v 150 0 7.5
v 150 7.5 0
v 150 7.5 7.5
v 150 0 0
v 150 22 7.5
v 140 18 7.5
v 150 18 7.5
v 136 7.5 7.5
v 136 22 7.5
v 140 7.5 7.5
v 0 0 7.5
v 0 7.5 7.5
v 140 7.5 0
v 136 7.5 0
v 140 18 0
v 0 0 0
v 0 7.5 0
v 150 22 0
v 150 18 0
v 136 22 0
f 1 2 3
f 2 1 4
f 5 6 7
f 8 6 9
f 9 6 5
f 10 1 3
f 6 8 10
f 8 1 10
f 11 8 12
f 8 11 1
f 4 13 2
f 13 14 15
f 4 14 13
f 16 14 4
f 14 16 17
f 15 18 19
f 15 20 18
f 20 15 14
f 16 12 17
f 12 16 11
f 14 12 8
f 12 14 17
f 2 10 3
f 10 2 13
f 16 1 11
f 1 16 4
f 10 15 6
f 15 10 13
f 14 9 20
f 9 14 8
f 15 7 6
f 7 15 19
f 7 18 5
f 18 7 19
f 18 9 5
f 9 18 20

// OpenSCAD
// file: ../../container.scad
function defaultBottomThickness() = 1;
function defaultBottomClearance() = 16;
function defaultMinWallThickness() = 1;
function defaultWallClearance() = 16;
function defaultSideMultiple() = 2;

function getOuterWidth(innerWidth, minWallThickness, sideMultiple) = ceil((innerWidth + 2*minWallThickness)/sideMultiple)*sideMultiple;
function getOuterDepth(innerDepth, minWallThickness, sideMultiple) = ceil((innerDepth + 2*minWallThickness)/sideMultiple)*sideMultiple;
function getSideWallThickness(innerWidth, minWallThickness, sideMultiple) = (getOuterWidth(innerWidth, minWallThickness, sideMultiple) - innerWidth)/2;
function getFrontWallThickness(innerDepth, minWallThickness, sideMultiple) = (getOuterDepth(innerDepth, minWallThickness, sideMultiple) - innerDepth)/2;

function getFrontHole(innerWidth, innerDepth, outerHeight, bottomClearance, minWallThickness, frontWallClearance, sideMultiple) = [
    [
        getSideWallThickness(innerWidth, minWallThickness, sideMultiple) + frontWallClearance,
        0,
        bottomClearance
    ],
    [
        max(5, innerWidth - 2*frontWallClearance),
        getOuterDepth(innerDepth, minWallThickness, sideMultiple),
        outerHeight
    ]
];

function getSideHole(innerWidth, innerDepth, outerHeight, bottomClearance, minWallThickness, sideWallClearance, sideMultiple) = [
    [
        0,
        getFrontWallThickness(innerDepth, minWallThickness, sideMultiple) + sideWallClearance,
        bottomClearance
    ],
    [
        getOuterWidth(innerWidth, minWallThickness, sideMultiple),
        max(5, innerDepth - 2*sideWallClearance),
        outerHeight
    ]
];

module container (
    innerWidth,
    innerDepth,
    outerHeight,
    type = "solid",
    bottomThickness = defaultBottomThickness(),
    bottomClearance = defaultBottomClearance(),
    minWallThickness = defaultMinWallThickness(),
    frontWallClearance = defaultWallClearance(),
    sideWallClearance = defaultWallClearance(),
    sideMultiple = defaultSideMultiple()
) {
    innerHeight = outerHeight - bottomThickness;
    
    outerWidth = getOuterWidth(innerWidth, minWallThickness, sideMultiple);
    outerDepth = getOuterDepth(innerDepth, minWallThickness, sideMultiple);
    sideWallThickness = getSideWallThickness(innerWidth, minWallThickness, sideMultiple);
    frontWallThickness = getFrontWallThickness(innerDepth, minWallThickness, sideMultiple);

    echo("Width", innerWidth, outerWidth, sideWallThickness);
    echo("Depth", innerDepth, outerDepth, frontWallThickness);

    baseHoleWidth = max(5, innerWidth - 2*bottomClearance);
    holeWidth = baseHoleWidth > innerWidth ? innerWidth/2 : baseHoleWidth;
    baseHoleDepth = max(5, innerDepth - 2*bottomClearance);
    holeDepth = baseHoleDepth > innerDepth ? innerDepth/2 : baseHoleDepth;
    holeX = sideWallThickness + innerWidth/2 - holeWidth/2;
    holeY = frontWallThickness + innerDepth/2 - holeDepth/2;
    
    frontHole = getFrontHole(
        innerWidth,
        innerDepth,
        outerHeight,
        bottomClearance,
        minWallThickness,
        frontWallClearance,
        sideMultiple
    );
    frontHolePosition = frontHole[0];
    frontHoleDimesions = frontHole[1];
    
    sideHole = getSideHole(
        innerWidth,
        innerDepth,
        outerHeight,
        bottomClearance,
        minWallThickness,
        sideWallClearance,
        sideMultiple
    );
    sideHolePosition = sideHole[0];
    sideHoleDimensions = sideHole[1];

    difference() {
        // Outer box
        cube([outerWidth, outerDepth, outerHeight]);
        
        // Inner box
        translate([sideWallThickness, frontWallThickness, bottomThickness])
        cube([innerWidth, innerDepth, innerHeight]);
        
        // Bottom hole
        translate([holeX, holeY, 0])
        cube([holeWidth, holeDepth, bottomThickness]);
        
        if(type == "hollow") {
            // Front and back hole
            translate(frontHolePosition)
            cube(frontHoleDimesions);
            
            // Side holes
            translate(sideHolePosition)
            cube(sideHoleDimensions);
        }
    }
}
// main file
use <../../container.scad>;

// Base dimensions
baseTolerance = .5;
baseWidth = 150;
baseDepth = 8 - baseTolerance;
height = baseDepth;
hookWidth = 10;

// Arm dimensions
armBaseWidth = 4;
armBaseDepth = 10 + baseTolerance;
armSideWidth = armBaseWidth + hookWidth;
armSideDepth = 4;

armBaseX = baseWidth - hookWidth - armBaseWidth;
armBasePosition = [
  armBaseX,
  baseDepth,
  0
];

armSidePosition = [
  armBaseX,
  baseDepth + armBaseDepth,
  0
];

// Key holder
cube([baseWidth, baseDepth, height]);
translate(armBasePosition)
cube([armBaseWidth, armBaseDepth, height]);
translate(armSidePosition)
cube([armSideWidth, armSideDepth, height]);

// Container dimensions
containerInnerWidth = height + baseTolerance;
containerInnerDepth = baseDepth + baseTolerance;
echo("Container", containerInnerWidth, containerInnerDepth, "x");
